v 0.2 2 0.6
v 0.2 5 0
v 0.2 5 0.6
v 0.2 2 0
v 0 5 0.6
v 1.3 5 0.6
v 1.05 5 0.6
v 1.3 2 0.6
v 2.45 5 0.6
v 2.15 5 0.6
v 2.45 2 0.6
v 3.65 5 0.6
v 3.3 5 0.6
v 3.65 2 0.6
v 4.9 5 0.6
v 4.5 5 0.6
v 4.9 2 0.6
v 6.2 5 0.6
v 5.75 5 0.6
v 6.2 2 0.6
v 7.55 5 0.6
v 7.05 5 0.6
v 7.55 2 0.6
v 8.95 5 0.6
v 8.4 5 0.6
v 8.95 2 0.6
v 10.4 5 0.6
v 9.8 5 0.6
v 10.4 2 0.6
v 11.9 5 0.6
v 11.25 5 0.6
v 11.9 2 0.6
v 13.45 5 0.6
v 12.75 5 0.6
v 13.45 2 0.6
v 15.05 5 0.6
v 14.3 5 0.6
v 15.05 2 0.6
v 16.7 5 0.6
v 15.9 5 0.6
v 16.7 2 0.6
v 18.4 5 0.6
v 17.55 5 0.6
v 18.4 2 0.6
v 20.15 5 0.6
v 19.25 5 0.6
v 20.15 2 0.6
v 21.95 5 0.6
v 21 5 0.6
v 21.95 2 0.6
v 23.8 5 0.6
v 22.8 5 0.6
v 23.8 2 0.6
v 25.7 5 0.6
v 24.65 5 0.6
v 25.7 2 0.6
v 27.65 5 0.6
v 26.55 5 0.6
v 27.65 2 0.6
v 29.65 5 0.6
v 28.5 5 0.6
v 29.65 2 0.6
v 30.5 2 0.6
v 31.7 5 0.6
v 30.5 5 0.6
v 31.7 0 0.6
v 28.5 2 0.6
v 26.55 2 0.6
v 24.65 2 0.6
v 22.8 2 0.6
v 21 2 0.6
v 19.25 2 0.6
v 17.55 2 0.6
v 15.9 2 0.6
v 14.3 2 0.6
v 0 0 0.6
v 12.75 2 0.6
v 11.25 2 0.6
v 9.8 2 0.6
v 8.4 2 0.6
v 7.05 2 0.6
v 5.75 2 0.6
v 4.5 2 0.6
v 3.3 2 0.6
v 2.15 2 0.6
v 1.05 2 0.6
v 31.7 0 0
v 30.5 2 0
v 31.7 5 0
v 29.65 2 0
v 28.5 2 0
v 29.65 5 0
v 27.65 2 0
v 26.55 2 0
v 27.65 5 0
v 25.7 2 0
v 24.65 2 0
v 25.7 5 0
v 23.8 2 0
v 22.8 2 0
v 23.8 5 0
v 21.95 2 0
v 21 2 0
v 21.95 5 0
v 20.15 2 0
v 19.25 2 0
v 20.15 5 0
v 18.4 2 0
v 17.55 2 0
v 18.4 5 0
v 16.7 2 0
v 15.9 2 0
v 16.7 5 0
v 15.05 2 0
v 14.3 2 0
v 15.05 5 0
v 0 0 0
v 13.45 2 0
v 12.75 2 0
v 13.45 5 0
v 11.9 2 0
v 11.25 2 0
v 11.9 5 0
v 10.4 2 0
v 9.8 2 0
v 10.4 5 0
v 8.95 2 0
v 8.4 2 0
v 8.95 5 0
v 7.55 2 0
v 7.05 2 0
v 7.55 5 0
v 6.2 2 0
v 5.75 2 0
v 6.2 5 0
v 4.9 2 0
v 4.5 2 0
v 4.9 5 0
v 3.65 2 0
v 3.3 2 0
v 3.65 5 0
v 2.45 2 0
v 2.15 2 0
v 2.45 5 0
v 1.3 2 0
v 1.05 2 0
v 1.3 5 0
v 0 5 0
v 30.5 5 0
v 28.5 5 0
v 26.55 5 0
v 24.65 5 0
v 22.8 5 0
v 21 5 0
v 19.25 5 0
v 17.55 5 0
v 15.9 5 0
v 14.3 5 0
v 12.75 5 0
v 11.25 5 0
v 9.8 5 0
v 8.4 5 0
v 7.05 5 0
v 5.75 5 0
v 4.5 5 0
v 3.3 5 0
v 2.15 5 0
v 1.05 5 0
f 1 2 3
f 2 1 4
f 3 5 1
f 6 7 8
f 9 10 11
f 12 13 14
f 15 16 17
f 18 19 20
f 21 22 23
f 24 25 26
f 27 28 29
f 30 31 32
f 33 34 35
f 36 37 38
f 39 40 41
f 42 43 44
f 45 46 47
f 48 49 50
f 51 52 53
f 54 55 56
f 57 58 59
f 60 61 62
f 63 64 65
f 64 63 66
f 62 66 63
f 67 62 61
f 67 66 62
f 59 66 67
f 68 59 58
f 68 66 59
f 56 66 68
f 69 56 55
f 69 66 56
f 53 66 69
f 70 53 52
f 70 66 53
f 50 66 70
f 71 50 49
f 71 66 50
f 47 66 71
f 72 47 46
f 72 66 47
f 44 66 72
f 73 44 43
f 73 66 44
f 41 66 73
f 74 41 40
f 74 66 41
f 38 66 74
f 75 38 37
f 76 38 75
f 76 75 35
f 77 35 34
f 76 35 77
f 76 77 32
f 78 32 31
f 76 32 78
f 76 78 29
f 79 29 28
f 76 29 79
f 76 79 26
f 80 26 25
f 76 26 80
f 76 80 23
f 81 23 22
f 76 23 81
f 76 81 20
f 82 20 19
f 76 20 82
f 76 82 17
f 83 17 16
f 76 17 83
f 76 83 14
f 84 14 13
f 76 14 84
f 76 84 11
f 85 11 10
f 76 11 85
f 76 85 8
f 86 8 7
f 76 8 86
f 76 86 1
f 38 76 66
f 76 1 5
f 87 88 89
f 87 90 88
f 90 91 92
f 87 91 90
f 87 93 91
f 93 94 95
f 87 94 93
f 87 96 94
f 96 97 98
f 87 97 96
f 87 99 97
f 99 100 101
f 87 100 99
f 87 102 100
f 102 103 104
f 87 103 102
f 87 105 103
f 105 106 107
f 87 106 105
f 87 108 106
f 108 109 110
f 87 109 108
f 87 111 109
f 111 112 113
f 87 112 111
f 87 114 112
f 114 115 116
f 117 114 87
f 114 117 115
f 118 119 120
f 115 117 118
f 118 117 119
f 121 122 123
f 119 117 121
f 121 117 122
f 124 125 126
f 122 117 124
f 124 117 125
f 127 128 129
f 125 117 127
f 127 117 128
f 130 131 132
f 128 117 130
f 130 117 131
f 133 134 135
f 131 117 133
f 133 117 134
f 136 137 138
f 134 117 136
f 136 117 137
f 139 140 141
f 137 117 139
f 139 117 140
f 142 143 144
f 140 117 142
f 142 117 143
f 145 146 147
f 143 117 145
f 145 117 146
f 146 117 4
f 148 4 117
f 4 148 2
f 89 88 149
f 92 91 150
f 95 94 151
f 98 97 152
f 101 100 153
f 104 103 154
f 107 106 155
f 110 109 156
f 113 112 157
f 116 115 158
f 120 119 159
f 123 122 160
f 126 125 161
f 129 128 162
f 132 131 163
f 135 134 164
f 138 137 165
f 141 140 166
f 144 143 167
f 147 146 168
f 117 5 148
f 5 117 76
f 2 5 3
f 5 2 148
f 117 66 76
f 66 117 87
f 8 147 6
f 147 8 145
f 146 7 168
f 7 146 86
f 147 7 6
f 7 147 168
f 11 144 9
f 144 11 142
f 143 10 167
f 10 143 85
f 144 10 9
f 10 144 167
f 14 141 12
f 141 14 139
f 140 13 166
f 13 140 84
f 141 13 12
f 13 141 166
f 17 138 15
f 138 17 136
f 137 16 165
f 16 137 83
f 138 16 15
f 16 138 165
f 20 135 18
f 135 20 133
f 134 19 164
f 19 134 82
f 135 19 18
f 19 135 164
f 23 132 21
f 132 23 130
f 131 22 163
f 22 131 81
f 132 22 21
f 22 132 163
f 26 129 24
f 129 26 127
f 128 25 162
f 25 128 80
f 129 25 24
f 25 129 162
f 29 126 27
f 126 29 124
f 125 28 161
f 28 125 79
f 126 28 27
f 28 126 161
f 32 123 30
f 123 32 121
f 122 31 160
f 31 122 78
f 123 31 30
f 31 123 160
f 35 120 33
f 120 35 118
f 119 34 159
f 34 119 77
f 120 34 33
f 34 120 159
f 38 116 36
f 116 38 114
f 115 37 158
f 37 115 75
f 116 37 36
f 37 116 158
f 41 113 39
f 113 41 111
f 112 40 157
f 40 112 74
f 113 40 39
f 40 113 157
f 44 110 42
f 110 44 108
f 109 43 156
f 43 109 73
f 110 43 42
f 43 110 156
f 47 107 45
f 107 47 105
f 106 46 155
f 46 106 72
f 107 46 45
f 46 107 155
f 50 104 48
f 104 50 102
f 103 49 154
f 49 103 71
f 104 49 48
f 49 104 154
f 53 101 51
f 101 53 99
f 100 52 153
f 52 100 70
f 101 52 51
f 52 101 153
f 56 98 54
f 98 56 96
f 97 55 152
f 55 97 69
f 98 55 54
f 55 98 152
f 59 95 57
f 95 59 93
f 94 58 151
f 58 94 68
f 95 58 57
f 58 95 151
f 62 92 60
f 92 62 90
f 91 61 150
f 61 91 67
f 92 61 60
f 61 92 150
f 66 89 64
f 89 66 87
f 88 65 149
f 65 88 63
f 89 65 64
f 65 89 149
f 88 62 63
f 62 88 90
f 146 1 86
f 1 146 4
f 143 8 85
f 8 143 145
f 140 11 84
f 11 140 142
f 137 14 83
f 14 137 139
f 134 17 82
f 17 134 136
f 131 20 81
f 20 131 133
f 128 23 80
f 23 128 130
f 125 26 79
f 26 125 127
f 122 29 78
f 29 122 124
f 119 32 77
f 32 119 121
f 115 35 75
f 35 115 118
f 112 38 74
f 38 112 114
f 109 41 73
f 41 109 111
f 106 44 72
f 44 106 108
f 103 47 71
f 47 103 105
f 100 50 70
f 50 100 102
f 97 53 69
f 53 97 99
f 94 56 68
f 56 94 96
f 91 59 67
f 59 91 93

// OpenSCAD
//make a calibration comb any size you want
//for checking slicer and printer settings
//mark peeters 2-1-2014

/* [calibration comb settings] */
//smallest tooth width (mm)
start_w=0.2;
//largest tooth (mm)(not exact but close)
end_w=1;
//tooth width increments(mm)
step_w=.05;
//space between teeth(mm)
spacing=1;
//tooth length(mm)
comb_l=5;
//tooth height(mm)
comb_h=.6;
//solid comb base height(mm)
base=2;


echo("total mm length of comb is",(end_w/step_w+1)*(end_w/2)+(spacing*end_w/step_w));

//make the base
cube([(end_w/step_w+1)*(end_w/2)+(spacing*end_w/step_w),base,comb_h]);

//make the teeth
for (i = [0:step_w:end_w]) {
//echo("tooth # is now",1+i/step_w);//for debug
//echo("tooth W is now",start_w+i);//for debug
translate([(i/step_w+1)*(i/2)+(spacing*i/step_w),0,0])cube([start_w+i,comb_l,comb_h]);
}
